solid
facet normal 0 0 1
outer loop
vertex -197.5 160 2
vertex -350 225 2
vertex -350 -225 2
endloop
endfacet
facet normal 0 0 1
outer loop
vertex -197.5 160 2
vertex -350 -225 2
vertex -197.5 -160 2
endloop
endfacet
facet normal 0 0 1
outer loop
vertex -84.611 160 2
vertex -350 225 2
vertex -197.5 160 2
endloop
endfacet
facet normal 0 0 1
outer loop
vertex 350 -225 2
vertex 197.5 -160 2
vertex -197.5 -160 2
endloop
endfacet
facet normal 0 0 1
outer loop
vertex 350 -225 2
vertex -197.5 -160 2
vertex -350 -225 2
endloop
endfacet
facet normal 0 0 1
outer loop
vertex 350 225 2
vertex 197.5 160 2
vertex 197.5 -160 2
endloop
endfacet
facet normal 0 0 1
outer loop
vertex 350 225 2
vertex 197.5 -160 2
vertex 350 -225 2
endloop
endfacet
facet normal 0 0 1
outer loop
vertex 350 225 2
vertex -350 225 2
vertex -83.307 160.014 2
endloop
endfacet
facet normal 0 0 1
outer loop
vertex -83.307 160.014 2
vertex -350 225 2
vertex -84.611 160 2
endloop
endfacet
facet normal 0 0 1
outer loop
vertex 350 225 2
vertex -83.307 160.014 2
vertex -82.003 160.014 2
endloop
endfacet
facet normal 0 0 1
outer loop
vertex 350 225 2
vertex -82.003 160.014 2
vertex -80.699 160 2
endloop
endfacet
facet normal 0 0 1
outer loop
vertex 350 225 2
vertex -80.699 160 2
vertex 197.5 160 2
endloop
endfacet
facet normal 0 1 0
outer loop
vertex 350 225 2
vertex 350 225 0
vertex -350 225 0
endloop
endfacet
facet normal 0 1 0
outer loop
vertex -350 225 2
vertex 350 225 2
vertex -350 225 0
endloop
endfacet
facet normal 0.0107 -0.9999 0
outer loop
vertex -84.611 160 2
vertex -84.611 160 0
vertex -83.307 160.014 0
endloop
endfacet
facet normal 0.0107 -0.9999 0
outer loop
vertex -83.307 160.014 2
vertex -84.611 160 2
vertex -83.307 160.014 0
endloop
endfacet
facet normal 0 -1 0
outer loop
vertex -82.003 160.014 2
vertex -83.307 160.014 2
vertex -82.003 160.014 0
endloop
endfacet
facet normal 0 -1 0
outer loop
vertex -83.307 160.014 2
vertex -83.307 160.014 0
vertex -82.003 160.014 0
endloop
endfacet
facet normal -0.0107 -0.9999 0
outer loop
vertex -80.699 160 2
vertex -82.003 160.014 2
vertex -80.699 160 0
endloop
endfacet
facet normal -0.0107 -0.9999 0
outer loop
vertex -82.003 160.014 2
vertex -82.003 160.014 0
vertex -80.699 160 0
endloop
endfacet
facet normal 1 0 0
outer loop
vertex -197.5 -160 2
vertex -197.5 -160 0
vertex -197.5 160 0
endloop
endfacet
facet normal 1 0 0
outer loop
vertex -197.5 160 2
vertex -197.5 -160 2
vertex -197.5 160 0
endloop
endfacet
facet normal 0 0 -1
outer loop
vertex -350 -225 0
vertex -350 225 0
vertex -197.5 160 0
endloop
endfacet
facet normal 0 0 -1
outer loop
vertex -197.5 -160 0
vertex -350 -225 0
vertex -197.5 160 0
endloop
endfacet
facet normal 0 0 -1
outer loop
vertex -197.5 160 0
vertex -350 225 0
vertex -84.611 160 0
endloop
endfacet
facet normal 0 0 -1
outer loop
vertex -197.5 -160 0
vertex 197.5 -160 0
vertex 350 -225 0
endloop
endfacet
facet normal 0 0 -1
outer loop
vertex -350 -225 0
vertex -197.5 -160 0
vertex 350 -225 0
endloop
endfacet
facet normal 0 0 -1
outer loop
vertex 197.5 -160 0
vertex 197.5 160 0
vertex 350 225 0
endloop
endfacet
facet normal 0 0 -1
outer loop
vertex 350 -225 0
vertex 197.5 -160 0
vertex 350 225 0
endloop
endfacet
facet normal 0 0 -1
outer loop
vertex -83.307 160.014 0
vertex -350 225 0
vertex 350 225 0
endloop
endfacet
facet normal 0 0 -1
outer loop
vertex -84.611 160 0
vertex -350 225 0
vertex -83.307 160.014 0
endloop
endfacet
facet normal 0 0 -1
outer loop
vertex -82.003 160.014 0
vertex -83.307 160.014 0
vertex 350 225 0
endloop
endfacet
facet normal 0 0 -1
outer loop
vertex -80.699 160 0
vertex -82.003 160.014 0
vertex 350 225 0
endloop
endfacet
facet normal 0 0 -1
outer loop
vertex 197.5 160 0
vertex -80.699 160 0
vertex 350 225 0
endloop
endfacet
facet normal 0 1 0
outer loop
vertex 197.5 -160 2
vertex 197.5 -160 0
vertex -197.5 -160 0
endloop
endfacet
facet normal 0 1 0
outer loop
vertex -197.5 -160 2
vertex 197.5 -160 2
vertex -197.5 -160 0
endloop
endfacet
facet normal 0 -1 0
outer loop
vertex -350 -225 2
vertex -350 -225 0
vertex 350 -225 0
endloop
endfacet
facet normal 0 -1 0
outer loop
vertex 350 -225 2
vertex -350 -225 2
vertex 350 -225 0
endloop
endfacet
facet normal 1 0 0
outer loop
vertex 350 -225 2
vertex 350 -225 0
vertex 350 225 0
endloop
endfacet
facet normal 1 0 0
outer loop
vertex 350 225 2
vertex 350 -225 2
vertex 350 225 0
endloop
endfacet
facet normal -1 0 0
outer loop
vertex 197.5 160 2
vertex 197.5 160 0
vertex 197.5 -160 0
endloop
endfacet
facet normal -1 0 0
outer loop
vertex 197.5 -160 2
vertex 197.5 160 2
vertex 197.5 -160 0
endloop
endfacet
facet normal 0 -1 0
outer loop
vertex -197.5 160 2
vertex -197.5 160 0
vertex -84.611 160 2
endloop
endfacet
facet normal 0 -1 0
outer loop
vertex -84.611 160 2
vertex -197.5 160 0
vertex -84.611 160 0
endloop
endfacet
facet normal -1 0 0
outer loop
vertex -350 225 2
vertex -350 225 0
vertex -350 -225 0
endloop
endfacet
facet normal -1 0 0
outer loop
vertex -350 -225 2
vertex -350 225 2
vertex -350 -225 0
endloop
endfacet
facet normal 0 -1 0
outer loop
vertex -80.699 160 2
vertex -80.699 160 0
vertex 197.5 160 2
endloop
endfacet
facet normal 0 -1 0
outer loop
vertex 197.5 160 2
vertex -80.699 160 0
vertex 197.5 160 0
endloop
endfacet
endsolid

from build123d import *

# Parameters (mm, degrees)
F2_DEPTH = 2


# Not quite as in the source:
# - the program builds the solid bodies; features that only make, move or delete a surface that nothing else refers to are left out


with BuildPart() as f2:
    # F0 (on Top) → F2 (new body)
    with BuildSketch(Plane.XY):
        Polygon((-350, -225), (350, -225), (350, -217.2532975674), (350, 225), (-350, 225), align=None)
        with BuildLine():
            Line((197.5, 160), (197.5, -160))
            Line((197.5, -160), (-197.5, -160))
            Line((-197.5, -160), (-197.5, 84.3677148223))
            Line((-197.5, 84.3677148223), (-197.5, 160))
            Line((-197.5, 160), (-84.6111023318, 160))
            ThreePointArc((-84.6111023318, 160), (-82.6551501399, 160.0153039327), (-80.699197948, 160))
            Line((-80.699197948, 160), (197.5, 160))
        make_face(mode=Mode.SUBTRACT)
    extrude(amount=F2_DEPTH)


solid = f2.part
